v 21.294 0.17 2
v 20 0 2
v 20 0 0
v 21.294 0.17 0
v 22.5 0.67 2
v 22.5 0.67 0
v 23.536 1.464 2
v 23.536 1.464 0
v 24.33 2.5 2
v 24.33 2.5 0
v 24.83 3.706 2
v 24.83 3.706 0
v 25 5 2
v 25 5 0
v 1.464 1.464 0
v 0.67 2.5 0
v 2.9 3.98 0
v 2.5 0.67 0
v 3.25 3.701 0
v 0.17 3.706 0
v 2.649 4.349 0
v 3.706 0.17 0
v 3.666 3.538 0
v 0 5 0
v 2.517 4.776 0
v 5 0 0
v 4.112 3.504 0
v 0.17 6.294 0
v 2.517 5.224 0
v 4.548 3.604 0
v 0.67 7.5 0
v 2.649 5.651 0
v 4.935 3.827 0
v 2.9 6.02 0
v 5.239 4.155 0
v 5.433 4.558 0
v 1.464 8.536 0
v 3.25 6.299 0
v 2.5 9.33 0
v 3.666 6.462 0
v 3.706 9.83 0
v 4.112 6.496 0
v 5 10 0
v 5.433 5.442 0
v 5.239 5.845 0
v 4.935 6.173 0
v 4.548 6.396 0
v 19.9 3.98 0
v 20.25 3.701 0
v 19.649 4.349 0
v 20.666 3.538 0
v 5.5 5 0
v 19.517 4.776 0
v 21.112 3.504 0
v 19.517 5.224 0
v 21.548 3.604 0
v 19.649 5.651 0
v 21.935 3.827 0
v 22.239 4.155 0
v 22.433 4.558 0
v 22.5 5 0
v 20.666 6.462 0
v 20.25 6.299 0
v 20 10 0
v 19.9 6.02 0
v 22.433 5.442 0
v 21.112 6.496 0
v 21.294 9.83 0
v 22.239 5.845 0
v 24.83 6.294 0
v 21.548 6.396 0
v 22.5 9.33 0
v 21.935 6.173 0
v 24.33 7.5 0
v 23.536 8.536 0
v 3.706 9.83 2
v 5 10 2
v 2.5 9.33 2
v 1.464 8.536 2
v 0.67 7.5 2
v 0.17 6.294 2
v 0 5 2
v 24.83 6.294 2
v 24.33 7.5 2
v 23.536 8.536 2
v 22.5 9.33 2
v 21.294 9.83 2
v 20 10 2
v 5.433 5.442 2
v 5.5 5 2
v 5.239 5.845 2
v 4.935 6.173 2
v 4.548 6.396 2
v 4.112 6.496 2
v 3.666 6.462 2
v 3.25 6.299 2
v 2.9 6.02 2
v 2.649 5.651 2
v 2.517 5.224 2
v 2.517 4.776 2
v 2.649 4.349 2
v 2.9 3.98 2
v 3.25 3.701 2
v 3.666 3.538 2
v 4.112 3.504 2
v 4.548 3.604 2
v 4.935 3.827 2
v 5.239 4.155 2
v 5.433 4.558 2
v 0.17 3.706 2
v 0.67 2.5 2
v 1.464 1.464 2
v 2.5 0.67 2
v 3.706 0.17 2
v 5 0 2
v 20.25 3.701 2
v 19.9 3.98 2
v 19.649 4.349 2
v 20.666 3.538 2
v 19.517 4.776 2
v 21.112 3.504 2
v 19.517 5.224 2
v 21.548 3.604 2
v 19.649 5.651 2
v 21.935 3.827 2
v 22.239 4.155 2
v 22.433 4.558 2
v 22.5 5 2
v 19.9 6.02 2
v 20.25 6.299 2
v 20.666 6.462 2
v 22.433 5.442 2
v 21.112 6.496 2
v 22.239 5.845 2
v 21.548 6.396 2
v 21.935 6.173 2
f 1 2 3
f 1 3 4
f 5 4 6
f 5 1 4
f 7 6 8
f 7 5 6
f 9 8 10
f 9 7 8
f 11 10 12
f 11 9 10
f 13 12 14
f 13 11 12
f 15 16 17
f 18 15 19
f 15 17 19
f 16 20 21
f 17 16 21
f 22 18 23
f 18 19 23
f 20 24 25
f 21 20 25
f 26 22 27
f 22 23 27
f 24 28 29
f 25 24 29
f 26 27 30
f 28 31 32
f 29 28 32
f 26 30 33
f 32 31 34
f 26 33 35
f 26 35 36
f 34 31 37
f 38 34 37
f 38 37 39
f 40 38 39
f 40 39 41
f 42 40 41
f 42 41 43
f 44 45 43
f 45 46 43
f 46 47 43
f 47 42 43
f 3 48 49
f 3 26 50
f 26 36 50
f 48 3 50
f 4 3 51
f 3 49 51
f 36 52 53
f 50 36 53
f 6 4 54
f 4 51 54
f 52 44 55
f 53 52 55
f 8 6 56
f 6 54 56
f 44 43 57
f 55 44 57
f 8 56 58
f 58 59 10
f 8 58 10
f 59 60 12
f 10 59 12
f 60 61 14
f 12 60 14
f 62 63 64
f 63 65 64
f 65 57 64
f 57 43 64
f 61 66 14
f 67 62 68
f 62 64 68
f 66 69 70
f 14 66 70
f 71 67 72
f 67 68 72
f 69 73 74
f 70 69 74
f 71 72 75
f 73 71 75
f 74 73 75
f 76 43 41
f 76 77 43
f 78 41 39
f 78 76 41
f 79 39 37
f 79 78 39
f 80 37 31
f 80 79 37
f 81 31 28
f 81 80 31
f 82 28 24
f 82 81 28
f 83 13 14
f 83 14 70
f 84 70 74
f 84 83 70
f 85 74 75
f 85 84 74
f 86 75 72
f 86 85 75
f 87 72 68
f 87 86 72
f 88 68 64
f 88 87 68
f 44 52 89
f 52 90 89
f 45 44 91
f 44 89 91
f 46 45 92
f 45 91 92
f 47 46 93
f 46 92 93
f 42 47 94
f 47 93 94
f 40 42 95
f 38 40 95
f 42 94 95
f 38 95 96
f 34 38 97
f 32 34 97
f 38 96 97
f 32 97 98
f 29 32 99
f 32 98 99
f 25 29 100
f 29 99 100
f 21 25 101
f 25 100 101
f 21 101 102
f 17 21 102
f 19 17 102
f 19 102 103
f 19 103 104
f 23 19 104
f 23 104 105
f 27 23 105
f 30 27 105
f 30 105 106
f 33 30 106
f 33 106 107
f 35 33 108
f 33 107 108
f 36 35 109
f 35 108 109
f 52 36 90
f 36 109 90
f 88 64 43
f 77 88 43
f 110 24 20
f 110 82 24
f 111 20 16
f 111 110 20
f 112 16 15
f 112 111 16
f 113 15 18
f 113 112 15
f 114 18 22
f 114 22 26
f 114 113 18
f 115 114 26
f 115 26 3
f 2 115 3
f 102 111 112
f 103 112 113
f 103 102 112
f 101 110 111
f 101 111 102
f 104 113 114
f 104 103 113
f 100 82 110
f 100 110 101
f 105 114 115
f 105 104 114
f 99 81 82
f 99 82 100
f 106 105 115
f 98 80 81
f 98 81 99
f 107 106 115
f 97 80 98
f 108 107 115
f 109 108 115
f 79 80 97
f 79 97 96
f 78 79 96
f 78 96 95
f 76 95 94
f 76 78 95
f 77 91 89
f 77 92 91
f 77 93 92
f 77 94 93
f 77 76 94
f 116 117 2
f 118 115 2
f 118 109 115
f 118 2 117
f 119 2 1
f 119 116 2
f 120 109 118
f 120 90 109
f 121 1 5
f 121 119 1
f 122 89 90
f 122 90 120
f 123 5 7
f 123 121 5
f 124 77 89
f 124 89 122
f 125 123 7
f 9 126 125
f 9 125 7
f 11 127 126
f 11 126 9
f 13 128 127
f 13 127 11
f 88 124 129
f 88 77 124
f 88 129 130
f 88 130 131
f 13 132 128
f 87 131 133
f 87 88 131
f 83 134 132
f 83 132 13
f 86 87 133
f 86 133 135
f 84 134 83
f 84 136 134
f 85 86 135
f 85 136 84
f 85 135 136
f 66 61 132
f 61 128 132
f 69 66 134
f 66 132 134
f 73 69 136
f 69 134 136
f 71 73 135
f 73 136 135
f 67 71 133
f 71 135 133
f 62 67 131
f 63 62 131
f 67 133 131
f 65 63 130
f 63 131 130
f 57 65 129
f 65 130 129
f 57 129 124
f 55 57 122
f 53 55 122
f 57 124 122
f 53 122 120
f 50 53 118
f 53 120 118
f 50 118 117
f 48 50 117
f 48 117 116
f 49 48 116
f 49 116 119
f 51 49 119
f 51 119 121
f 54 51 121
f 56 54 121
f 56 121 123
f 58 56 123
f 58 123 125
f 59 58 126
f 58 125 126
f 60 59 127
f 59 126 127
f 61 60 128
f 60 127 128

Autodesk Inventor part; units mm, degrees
ref_plane "YZ Plane" through (0, 0, 0) normal (1, 0, 0) x (0, 1, 0)
ref_plane "XZ Plane" through (0, 0, 0) normal (0, 1, 0) x (-1, 0, 0)
ref_plane "XY Plane" through (0, 0, 0) normal (0, 0, 1) x (1, 0, 0)
sketch "Sketch1" plane through (0, 0, 0) normal (0, 0, 1) x (1, 0, 0)
  line L0 (0, 0) -> (25, 0)
  line L1 (25, 0) -> (25, 10)
  line L2 (25, 10) -> (0, 10)
  line L3 (0, 10) -> (0, 0)
  dimension "d0" = 25
  dimension "d1" = 10
extrude "Extrusion1" add sketch "Sketch1" along normal blind 2
fillet "Fillet1" radius 5 4 edges at (25, 10, 1) (25, 0, 1) (0, 0, 1) (0, 10, 1)
sketch "Sketch2" plane through (0, 0, 2) normal (0, 0, 1) x (1, 0, 0)
  arc A0 (5, 10) -> (5, 0) centre (5, 5) ccw projected
  arc A1 (20, 0) -> (20, 10) centre (20, 5) ccw projected
  line L0 (5, 5) -> (4, 5)
  line L1 (4, 5) -> (21, 5)
  circle A2 centre (4, 5) radius 1.5
  circle A3 centre (21, 5) radius 1.5
  point P0 (0, 0)
  dimension "d9" = 1
  dimension "d10" = 17
  dimension "d11" = 3
  dimension "d12" = 3
extrude "Extrusion3" cut sketch "Sketch2" against normal blind 10
properties part number "Middle support"
